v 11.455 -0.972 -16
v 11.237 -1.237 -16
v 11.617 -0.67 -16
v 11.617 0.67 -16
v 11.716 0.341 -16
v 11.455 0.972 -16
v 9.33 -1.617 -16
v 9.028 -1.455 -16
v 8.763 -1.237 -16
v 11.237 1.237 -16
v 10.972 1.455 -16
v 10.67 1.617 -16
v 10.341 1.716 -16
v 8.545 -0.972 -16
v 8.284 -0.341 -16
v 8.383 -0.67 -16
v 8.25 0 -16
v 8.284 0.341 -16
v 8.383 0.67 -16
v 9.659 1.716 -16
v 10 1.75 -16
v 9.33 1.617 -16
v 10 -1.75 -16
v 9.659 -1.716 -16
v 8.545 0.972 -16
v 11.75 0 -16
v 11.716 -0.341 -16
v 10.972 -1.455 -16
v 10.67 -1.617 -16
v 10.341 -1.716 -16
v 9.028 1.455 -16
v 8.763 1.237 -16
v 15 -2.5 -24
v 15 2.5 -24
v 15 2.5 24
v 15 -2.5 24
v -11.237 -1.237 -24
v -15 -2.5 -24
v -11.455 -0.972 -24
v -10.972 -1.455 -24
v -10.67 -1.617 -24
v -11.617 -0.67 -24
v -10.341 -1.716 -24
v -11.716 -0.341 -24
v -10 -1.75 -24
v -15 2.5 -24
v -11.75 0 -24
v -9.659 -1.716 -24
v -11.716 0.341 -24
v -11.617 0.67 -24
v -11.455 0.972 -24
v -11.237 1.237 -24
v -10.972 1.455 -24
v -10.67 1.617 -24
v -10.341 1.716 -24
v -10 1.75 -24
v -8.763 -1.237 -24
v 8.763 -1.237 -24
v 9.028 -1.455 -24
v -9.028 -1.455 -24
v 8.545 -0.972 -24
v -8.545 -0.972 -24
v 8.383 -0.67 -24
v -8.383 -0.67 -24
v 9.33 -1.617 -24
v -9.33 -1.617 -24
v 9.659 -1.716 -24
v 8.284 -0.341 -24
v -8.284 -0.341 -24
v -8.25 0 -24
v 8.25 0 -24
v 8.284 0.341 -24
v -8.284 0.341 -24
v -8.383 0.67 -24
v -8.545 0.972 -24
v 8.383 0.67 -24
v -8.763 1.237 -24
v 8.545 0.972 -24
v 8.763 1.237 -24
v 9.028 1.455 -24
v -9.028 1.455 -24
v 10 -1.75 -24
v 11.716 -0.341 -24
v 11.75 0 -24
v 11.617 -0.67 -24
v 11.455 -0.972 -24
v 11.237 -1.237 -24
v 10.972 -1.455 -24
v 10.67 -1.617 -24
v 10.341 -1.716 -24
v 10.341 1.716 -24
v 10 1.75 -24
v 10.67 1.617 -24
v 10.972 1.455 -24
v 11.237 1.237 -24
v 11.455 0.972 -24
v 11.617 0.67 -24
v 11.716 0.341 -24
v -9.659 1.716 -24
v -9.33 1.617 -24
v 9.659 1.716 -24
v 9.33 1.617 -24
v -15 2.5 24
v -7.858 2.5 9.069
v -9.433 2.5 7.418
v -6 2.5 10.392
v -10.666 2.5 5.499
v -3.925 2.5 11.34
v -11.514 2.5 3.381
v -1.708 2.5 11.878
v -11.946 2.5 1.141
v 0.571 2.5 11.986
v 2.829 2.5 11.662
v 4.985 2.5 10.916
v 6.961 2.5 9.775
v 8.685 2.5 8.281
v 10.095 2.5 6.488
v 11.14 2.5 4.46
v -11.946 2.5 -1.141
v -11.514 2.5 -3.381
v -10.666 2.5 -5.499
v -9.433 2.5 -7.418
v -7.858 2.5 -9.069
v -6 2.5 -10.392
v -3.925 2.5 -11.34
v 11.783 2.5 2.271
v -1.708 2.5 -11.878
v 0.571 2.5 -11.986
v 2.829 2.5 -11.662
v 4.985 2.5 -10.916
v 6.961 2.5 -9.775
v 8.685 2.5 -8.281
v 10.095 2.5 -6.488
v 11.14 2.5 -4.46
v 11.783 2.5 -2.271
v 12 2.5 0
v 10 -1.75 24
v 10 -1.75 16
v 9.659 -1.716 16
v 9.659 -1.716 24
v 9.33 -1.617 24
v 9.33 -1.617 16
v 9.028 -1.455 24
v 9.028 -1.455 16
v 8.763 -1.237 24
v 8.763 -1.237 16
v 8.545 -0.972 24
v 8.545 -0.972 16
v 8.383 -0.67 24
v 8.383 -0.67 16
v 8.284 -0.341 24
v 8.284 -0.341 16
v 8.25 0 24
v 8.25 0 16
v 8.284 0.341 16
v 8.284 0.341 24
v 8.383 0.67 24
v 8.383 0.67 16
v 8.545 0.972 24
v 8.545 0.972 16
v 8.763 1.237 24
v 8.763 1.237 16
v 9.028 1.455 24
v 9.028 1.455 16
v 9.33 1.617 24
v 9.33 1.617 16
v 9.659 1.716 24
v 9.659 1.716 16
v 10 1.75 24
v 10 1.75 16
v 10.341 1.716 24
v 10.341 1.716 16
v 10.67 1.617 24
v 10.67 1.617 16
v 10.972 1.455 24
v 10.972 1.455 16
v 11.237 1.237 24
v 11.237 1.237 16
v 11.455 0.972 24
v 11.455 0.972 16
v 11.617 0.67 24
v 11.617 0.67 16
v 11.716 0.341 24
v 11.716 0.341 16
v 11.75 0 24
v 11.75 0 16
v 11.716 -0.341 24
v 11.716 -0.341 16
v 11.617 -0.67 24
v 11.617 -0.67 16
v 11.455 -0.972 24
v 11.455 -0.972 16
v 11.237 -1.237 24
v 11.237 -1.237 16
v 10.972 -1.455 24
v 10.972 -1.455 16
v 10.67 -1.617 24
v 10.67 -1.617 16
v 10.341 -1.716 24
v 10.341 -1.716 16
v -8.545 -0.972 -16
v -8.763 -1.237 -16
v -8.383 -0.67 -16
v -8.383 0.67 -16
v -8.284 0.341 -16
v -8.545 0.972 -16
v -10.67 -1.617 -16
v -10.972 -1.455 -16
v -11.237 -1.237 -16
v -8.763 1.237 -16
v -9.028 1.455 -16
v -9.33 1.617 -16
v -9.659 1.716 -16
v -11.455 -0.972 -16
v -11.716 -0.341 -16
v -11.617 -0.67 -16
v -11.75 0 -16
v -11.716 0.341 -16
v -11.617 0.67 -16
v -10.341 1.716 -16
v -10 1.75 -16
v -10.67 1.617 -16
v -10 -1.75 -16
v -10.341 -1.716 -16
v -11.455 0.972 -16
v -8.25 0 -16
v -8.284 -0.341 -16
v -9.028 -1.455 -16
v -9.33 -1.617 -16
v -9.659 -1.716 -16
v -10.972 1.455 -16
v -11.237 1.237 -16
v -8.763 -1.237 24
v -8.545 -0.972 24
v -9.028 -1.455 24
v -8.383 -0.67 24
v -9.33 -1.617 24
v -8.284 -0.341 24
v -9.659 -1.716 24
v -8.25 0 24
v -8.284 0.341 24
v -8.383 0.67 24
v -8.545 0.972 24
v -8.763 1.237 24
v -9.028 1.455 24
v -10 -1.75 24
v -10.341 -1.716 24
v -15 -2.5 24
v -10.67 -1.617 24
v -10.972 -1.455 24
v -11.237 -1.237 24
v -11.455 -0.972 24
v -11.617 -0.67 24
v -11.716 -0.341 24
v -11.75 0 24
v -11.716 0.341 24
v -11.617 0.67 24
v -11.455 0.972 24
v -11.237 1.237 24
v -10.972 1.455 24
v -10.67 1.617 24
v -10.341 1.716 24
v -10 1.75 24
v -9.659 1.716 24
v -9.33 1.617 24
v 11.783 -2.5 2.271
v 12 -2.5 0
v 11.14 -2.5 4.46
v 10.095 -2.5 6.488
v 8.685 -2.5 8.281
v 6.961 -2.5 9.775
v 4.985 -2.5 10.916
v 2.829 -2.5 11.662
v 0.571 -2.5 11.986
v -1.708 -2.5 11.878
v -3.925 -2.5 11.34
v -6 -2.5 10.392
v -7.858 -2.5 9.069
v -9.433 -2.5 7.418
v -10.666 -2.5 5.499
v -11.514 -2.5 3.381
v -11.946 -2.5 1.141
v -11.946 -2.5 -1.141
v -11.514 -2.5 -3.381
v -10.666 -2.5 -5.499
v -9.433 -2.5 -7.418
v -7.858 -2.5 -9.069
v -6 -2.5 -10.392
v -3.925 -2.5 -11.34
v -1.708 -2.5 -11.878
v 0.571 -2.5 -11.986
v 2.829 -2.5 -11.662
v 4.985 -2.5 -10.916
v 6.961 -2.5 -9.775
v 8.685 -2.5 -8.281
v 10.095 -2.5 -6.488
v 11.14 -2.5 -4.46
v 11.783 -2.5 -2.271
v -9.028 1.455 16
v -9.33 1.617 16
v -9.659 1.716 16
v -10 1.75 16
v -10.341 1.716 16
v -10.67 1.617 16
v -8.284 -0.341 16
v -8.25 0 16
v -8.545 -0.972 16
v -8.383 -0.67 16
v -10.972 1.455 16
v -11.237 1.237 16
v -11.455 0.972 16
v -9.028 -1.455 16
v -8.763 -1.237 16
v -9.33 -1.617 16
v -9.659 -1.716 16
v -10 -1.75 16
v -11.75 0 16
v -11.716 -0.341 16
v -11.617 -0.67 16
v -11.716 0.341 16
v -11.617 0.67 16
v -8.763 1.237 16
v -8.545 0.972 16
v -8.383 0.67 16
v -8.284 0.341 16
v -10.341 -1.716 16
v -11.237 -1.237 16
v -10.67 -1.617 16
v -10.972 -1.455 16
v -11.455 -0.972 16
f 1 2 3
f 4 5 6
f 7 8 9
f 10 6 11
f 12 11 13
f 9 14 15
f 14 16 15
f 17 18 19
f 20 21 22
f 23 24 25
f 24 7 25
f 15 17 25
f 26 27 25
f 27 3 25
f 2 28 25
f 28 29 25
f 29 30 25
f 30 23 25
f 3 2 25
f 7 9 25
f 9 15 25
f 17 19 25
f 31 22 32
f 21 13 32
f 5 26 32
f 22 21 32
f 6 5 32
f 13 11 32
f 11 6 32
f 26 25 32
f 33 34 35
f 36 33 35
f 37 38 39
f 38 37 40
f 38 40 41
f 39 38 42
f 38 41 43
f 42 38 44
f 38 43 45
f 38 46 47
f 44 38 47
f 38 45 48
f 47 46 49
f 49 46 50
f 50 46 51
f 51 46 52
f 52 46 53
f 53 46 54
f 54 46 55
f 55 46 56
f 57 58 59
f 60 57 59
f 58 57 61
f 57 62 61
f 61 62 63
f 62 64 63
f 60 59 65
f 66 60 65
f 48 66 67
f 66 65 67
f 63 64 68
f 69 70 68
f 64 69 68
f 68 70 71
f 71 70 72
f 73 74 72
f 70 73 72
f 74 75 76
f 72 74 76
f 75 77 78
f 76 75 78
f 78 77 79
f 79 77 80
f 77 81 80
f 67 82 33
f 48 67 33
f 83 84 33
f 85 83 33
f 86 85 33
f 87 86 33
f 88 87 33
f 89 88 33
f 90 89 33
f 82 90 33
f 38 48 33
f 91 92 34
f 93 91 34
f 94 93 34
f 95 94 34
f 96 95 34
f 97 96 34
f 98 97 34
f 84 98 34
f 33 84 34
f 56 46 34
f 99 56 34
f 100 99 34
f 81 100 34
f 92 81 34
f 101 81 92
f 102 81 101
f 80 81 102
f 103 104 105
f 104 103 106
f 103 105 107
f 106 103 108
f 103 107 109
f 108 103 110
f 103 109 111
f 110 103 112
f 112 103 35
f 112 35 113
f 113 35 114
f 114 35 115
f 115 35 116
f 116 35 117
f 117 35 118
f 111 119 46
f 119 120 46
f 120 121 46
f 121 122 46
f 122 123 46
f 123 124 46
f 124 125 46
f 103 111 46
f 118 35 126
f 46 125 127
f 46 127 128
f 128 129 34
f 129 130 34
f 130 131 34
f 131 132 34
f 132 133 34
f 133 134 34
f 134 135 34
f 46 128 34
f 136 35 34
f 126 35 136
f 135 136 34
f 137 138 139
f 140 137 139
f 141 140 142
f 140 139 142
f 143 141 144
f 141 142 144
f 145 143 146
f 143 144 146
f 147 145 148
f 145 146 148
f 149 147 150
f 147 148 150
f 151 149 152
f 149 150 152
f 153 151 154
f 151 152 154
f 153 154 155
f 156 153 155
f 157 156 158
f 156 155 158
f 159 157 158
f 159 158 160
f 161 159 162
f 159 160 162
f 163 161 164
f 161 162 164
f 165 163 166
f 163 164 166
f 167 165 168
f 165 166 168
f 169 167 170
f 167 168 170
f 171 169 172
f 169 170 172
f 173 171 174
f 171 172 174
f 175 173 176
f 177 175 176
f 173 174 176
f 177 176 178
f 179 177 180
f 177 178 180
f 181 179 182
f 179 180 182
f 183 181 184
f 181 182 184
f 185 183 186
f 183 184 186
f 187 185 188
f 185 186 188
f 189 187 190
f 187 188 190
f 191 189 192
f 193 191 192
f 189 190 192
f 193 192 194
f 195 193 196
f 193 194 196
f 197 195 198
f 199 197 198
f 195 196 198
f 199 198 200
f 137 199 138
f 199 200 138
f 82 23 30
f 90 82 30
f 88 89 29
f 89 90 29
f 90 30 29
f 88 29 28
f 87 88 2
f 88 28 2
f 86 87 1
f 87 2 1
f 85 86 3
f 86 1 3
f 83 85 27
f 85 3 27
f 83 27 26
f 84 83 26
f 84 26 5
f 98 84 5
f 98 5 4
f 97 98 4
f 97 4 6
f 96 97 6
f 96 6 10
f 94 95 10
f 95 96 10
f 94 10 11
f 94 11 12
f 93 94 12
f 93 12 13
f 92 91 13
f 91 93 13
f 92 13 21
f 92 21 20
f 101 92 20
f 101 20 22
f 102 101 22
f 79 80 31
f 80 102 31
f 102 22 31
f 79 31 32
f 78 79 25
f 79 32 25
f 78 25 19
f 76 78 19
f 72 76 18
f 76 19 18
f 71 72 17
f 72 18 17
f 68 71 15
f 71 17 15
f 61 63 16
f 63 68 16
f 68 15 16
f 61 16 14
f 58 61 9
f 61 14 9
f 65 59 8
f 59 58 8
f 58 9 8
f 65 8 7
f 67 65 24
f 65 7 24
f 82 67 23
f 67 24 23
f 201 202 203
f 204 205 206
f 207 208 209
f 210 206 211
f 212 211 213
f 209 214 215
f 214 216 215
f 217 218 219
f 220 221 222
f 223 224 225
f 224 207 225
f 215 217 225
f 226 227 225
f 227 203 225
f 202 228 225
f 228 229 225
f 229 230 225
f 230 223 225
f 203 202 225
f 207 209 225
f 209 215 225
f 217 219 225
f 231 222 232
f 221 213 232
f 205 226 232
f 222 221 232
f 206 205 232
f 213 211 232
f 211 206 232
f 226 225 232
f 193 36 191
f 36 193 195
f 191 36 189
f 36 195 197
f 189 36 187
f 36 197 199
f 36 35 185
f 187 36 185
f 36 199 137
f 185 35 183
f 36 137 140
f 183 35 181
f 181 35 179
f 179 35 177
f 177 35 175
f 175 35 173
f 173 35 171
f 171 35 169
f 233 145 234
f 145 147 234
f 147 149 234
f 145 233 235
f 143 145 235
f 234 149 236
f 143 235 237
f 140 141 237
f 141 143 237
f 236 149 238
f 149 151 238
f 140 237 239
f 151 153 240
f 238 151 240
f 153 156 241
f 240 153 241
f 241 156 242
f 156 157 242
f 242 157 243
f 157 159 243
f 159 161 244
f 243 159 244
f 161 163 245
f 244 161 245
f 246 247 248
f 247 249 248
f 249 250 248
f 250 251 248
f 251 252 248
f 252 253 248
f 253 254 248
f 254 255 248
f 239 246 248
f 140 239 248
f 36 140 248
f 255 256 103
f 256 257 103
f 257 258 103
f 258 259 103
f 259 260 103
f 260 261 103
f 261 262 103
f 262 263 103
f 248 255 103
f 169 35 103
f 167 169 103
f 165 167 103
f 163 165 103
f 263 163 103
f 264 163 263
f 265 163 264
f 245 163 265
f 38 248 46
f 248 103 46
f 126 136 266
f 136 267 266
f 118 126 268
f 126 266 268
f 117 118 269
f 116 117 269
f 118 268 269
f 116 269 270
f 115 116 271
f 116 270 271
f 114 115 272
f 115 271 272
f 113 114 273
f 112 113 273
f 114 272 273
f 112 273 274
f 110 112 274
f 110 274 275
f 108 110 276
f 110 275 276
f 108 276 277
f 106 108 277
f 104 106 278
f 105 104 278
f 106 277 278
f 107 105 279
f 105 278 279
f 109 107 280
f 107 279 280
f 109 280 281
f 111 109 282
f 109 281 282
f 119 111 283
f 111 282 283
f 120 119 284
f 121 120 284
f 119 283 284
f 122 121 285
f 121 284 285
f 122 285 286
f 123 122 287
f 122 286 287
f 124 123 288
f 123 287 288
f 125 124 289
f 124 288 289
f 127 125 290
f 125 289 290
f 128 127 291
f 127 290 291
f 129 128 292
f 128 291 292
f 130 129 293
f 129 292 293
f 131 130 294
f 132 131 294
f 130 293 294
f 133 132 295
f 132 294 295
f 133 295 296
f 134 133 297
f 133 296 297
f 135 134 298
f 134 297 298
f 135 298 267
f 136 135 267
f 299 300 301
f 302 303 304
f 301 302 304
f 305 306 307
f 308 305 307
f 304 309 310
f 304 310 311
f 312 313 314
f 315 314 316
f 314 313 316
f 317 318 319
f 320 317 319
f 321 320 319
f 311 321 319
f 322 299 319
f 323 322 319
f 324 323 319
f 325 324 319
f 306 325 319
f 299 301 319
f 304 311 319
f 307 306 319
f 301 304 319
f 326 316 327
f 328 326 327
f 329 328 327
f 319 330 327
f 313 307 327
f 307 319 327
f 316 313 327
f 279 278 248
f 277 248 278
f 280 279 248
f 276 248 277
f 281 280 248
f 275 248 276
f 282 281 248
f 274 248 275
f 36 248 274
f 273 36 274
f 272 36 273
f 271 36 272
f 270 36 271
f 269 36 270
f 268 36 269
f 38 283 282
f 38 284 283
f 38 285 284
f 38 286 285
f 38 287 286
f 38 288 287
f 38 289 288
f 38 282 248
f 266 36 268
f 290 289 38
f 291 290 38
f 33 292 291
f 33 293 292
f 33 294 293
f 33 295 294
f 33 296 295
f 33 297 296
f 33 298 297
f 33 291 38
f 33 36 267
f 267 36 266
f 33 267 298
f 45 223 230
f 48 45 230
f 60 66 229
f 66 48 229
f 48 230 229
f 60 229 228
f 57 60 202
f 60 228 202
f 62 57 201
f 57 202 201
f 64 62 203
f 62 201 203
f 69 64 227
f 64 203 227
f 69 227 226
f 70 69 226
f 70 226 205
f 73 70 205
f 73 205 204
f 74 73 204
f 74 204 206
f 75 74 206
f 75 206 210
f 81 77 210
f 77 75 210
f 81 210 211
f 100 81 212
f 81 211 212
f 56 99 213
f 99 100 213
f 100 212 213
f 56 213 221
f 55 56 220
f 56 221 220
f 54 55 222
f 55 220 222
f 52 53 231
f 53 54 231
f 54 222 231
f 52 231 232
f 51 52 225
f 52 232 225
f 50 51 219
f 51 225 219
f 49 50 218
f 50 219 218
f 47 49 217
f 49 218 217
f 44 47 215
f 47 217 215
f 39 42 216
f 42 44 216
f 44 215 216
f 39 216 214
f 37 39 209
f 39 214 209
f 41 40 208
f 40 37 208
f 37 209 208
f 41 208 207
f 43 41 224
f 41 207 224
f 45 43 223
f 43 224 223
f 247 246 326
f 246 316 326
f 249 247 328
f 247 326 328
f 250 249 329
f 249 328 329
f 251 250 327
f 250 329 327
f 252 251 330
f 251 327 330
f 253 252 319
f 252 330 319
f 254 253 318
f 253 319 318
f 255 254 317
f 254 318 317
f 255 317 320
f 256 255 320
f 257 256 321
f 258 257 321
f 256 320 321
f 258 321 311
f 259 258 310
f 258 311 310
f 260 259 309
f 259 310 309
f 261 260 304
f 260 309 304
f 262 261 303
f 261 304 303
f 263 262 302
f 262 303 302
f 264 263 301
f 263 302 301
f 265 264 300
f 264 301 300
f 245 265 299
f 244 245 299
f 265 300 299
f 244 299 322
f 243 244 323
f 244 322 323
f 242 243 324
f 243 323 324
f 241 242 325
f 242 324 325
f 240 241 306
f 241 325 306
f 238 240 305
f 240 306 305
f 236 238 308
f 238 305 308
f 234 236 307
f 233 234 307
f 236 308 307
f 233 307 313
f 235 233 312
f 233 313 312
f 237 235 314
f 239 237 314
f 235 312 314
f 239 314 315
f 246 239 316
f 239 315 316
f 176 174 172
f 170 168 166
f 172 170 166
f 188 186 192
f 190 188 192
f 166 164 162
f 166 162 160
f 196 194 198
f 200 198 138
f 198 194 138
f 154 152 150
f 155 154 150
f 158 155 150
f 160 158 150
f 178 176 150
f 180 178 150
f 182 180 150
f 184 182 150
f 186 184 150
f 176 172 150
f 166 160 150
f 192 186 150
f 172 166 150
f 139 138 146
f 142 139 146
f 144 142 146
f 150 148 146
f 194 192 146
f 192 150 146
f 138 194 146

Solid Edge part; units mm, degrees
sketch "Sketch1" plane through (0, 0, 0) normal (0, -1, 0) x (1, 0, 0)
  line L0 (-15, -24) -> (15, -24)
  line L1 (15, -24) -> (15, 24)
  line L2 (15, 24) -> (-15, 24)
  line L3 (-15, 24) -> (-15, -24)
  dimension "D1" = 48
  dimension "D2" = 30
extrude "Protrusion1" add sketch "Sketch1" along normal mid plane 5
sketch "Sketch2" plane through (0, -2.5, 0) normal (0, -1, 0) x (1, 0, 0)
  circle A0 centre (0, 0) radius 12
  dimension "D1" = 24
extrude "Extrusionsausschnitt_1" cut sketch "Sketch2" against normal blind 310
hole "Bohrung_1" at (-10, 0, 24) direction (0, 0, -1) diameter 3.5 depth 8
hole "Hole1" at (10, 0, 24) direction (0, 0, -1) diameter 3.5 depth 8
mirror "Mirror1" about plane through (0, 0, 0) normal (0, 0, 1) of "Bohrung_1", "Hole1"
properties material "Aluminiumlegierung:3.0205, Al 99.0, EN-AW 1200"
